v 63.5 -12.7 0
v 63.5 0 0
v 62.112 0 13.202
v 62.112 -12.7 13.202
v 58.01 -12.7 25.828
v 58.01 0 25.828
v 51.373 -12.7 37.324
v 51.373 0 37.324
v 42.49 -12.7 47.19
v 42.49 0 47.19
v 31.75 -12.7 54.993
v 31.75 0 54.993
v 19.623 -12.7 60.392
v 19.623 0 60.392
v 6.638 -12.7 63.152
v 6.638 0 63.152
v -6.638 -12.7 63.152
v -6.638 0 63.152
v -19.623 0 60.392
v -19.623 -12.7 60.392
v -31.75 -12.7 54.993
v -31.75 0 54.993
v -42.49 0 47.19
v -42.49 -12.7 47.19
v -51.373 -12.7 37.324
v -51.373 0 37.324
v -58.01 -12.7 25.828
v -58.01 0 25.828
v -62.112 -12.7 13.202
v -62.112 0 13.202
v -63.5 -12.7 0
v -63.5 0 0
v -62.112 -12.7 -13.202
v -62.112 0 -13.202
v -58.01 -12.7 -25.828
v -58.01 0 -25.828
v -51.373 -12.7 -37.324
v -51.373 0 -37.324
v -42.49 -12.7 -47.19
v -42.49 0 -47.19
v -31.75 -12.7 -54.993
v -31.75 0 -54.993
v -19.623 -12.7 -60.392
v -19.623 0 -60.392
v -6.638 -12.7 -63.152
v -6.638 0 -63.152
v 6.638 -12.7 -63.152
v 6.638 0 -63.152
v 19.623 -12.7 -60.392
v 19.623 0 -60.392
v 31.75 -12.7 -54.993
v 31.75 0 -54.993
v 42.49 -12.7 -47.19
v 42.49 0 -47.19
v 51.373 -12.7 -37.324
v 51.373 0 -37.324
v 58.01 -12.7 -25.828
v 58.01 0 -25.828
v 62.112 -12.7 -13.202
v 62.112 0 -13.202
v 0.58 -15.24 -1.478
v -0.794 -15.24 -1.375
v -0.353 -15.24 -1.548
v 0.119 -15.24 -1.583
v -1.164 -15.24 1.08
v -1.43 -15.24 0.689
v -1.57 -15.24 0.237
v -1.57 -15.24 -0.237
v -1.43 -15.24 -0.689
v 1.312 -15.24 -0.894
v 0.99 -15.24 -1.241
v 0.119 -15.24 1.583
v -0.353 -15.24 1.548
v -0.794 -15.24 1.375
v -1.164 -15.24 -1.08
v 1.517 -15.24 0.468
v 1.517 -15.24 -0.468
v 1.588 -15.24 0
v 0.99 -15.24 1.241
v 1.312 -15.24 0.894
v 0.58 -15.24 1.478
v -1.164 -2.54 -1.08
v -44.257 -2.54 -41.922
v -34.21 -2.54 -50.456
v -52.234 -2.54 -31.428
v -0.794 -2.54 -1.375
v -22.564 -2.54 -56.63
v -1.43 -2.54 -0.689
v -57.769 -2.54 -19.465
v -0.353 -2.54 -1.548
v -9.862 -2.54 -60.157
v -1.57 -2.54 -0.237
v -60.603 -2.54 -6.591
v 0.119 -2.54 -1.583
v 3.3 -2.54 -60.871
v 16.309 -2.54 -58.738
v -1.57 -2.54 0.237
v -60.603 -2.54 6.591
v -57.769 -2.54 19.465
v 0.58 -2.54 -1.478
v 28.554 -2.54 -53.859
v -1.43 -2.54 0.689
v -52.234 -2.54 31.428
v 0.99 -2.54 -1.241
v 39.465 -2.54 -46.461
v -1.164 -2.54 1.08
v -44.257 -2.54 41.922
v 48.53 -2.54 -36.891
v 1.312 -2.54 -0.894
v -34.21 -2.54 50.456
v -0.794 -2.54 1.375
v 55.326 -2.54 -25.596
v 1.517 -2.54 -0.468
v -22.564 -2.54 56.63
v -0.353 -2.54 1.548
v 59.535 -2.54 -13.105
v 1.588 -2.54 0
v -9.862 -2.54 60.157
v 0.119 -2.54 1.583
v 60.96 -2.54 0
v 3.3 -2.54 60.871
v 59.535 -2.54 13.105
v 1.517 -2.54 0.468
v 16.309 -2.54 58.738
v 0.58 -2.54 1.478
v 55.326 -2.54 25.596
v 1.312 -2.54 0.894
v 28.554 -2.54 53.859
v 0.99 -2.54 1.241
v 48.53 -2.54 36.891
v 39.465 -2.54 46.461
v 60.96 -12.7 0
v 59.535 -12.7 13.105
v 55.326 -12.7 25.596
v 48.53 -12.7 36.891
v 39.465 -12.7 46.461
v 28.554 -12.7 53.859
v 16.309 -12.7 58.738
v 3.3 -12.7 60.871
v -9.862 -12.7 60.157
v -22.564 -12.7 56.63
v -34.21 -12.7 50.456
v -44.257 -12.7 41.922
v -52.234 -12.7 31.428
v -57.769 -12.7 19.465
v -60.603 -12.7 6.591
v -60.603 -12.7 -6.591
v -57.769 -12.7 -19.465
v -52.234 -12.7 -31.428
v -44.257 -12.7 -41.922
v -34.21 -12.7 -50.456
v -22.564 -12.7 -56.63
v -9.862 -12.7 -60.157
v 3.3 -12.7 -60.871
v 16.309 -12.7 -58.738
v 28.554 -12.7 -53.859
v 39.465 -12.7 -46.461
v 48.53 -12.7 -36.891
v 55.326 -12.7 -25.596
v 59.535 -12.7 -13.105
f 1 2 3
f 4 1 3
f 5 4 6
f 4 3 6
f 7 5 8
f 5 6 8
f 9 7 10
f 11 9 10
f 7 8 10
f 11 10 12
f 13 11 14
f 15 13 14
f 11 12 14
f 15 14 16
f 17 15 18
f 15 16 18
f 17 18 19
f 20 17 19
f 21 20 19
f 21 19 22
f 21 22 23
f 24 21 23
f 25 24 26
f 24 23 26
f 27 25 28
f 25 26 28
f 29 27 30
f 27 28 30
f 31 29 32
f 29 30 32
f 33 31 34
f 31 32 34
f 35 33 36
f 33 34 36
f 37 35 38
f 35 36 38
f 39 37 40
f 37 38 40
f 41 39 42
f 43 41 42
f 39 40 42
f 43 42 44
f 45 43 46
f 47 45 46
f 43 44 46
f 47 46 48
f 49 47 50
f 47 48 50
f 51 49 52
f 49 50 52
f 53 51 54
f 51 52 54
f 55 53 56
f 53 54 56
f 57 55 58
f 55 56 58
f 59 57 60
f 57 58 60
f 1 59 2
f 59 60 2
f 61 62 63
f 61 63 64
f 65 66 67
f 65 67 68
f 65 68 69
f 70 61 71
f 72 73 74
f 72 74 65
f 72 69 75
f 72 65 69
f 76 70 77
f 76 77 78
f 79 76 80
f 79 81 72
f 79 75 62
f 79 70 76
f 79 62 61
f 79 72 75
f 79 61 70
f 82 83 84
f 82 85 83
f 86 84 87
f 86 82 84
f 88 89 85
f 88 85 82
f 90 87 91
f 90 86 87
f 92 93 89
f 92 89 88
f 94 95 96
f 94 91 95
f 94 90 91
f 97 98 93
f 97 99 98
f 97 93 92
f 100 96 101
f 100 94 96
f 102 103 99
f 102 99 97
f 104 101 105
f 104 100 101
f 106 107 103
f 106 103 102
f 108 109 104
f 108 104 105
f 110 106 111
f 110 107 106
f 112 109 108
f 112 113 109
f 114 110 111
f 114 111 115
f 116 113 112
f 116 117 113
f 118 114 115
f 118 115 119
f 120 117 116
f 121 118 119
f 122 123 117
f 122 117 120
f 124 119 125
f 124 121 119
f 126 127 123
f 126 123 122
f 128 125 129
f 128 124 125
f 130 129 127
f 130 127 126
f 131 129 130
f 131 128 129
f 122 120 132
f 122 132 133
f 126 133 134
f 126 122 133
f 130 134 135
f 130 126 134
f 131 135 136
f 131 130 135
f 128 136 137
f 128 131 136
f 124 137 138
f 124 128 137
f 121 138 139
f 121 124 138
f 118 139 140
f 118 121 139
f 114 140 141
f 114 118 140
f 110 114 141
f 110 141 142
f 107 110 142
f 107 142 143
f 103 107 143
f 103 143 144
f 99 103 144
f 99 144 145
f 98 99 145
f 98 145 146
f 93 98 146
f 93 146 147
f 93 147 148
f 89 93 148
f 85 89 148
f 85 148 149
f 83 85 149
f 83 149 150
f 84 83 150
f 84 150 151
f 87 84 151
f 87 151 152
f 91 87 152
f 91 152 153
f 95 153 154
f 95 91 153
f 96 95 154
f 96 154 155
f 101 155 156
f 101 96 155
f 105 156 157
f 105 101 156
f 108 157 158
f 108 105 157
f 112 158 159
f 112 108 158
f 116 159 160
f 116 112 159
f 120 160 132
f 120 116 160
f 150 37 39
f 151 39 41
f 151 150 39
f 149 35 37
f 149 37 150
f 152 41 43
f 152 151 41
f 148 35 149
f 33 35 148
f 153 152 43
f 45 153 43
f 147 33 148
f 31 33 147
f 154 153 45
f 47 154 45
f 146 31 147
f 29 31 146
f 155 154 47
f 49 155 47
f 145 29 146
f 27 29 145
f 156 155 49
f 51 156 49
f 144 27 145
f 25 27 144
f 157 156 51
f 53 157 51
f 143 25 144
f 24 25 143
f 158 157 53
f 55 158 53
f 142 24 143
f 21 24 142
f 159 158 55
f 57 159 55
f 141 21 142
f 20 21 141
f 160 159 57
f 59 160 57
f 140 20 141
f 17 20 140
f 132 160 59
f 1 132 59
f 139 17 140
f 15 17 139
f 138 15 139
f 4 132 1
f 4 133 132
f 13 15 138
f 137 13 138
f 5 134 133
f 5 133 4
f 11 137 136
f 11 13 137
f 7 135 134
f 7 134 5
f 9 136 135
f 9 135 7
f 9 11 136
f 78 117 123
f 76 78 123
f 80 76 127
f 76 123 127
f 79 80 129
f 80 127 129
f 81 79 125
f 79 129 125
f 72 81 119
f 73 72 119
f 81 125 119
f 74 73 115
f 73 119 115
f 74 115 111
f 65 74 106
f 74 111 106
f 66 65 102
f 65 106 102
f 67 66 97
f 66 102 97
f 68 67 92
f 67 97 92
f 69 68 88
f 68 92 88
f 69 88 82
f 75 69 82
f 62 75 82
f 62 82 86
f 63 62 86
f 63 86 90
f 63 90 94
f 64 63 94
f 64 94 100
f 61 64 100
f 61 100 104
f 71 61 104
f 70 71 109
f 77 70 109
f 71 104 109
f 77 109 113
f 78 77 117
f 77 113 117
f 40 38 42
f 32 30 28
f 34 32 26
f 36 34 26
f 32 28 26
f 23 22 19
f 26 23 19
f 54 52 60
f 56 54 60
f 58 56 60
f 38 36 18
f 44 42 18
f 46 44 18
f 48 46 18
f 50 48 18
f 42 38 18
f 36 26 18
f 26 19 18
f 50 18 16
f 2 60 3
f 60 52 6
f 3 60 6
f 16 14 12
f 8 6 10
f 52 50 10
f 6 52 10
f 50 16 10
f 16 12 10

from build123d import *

# Parameters (mm, degrees)
F0_R     = 63.5
F1_DEPTH = 12.7
F2_T     = -2.54
F3_R     = 1.5875
F4_DEPTH = 12.7


with BuildPart() as f1:
    # F0 (on Front) → F1 (new body)
    with BuildSketch(Plane.XZ):
        Circle(F0_R)
    extrude(amount=F1_DEPTH)

    # F2
    f2_openings = [f1.faces().sort_by_distance(p)[0] for p in [
        (0, -12.7, 0),
    ]]
    offset(amount=F2_T, openings=f2_openings)

    # F3 (on face) → F4 (join)
    with BuildSketch(Plane.XZ.offset(2.54)):
        Circle(F3_R)
    extrude(amount=F4_DEPTH)


solid = f1.part
